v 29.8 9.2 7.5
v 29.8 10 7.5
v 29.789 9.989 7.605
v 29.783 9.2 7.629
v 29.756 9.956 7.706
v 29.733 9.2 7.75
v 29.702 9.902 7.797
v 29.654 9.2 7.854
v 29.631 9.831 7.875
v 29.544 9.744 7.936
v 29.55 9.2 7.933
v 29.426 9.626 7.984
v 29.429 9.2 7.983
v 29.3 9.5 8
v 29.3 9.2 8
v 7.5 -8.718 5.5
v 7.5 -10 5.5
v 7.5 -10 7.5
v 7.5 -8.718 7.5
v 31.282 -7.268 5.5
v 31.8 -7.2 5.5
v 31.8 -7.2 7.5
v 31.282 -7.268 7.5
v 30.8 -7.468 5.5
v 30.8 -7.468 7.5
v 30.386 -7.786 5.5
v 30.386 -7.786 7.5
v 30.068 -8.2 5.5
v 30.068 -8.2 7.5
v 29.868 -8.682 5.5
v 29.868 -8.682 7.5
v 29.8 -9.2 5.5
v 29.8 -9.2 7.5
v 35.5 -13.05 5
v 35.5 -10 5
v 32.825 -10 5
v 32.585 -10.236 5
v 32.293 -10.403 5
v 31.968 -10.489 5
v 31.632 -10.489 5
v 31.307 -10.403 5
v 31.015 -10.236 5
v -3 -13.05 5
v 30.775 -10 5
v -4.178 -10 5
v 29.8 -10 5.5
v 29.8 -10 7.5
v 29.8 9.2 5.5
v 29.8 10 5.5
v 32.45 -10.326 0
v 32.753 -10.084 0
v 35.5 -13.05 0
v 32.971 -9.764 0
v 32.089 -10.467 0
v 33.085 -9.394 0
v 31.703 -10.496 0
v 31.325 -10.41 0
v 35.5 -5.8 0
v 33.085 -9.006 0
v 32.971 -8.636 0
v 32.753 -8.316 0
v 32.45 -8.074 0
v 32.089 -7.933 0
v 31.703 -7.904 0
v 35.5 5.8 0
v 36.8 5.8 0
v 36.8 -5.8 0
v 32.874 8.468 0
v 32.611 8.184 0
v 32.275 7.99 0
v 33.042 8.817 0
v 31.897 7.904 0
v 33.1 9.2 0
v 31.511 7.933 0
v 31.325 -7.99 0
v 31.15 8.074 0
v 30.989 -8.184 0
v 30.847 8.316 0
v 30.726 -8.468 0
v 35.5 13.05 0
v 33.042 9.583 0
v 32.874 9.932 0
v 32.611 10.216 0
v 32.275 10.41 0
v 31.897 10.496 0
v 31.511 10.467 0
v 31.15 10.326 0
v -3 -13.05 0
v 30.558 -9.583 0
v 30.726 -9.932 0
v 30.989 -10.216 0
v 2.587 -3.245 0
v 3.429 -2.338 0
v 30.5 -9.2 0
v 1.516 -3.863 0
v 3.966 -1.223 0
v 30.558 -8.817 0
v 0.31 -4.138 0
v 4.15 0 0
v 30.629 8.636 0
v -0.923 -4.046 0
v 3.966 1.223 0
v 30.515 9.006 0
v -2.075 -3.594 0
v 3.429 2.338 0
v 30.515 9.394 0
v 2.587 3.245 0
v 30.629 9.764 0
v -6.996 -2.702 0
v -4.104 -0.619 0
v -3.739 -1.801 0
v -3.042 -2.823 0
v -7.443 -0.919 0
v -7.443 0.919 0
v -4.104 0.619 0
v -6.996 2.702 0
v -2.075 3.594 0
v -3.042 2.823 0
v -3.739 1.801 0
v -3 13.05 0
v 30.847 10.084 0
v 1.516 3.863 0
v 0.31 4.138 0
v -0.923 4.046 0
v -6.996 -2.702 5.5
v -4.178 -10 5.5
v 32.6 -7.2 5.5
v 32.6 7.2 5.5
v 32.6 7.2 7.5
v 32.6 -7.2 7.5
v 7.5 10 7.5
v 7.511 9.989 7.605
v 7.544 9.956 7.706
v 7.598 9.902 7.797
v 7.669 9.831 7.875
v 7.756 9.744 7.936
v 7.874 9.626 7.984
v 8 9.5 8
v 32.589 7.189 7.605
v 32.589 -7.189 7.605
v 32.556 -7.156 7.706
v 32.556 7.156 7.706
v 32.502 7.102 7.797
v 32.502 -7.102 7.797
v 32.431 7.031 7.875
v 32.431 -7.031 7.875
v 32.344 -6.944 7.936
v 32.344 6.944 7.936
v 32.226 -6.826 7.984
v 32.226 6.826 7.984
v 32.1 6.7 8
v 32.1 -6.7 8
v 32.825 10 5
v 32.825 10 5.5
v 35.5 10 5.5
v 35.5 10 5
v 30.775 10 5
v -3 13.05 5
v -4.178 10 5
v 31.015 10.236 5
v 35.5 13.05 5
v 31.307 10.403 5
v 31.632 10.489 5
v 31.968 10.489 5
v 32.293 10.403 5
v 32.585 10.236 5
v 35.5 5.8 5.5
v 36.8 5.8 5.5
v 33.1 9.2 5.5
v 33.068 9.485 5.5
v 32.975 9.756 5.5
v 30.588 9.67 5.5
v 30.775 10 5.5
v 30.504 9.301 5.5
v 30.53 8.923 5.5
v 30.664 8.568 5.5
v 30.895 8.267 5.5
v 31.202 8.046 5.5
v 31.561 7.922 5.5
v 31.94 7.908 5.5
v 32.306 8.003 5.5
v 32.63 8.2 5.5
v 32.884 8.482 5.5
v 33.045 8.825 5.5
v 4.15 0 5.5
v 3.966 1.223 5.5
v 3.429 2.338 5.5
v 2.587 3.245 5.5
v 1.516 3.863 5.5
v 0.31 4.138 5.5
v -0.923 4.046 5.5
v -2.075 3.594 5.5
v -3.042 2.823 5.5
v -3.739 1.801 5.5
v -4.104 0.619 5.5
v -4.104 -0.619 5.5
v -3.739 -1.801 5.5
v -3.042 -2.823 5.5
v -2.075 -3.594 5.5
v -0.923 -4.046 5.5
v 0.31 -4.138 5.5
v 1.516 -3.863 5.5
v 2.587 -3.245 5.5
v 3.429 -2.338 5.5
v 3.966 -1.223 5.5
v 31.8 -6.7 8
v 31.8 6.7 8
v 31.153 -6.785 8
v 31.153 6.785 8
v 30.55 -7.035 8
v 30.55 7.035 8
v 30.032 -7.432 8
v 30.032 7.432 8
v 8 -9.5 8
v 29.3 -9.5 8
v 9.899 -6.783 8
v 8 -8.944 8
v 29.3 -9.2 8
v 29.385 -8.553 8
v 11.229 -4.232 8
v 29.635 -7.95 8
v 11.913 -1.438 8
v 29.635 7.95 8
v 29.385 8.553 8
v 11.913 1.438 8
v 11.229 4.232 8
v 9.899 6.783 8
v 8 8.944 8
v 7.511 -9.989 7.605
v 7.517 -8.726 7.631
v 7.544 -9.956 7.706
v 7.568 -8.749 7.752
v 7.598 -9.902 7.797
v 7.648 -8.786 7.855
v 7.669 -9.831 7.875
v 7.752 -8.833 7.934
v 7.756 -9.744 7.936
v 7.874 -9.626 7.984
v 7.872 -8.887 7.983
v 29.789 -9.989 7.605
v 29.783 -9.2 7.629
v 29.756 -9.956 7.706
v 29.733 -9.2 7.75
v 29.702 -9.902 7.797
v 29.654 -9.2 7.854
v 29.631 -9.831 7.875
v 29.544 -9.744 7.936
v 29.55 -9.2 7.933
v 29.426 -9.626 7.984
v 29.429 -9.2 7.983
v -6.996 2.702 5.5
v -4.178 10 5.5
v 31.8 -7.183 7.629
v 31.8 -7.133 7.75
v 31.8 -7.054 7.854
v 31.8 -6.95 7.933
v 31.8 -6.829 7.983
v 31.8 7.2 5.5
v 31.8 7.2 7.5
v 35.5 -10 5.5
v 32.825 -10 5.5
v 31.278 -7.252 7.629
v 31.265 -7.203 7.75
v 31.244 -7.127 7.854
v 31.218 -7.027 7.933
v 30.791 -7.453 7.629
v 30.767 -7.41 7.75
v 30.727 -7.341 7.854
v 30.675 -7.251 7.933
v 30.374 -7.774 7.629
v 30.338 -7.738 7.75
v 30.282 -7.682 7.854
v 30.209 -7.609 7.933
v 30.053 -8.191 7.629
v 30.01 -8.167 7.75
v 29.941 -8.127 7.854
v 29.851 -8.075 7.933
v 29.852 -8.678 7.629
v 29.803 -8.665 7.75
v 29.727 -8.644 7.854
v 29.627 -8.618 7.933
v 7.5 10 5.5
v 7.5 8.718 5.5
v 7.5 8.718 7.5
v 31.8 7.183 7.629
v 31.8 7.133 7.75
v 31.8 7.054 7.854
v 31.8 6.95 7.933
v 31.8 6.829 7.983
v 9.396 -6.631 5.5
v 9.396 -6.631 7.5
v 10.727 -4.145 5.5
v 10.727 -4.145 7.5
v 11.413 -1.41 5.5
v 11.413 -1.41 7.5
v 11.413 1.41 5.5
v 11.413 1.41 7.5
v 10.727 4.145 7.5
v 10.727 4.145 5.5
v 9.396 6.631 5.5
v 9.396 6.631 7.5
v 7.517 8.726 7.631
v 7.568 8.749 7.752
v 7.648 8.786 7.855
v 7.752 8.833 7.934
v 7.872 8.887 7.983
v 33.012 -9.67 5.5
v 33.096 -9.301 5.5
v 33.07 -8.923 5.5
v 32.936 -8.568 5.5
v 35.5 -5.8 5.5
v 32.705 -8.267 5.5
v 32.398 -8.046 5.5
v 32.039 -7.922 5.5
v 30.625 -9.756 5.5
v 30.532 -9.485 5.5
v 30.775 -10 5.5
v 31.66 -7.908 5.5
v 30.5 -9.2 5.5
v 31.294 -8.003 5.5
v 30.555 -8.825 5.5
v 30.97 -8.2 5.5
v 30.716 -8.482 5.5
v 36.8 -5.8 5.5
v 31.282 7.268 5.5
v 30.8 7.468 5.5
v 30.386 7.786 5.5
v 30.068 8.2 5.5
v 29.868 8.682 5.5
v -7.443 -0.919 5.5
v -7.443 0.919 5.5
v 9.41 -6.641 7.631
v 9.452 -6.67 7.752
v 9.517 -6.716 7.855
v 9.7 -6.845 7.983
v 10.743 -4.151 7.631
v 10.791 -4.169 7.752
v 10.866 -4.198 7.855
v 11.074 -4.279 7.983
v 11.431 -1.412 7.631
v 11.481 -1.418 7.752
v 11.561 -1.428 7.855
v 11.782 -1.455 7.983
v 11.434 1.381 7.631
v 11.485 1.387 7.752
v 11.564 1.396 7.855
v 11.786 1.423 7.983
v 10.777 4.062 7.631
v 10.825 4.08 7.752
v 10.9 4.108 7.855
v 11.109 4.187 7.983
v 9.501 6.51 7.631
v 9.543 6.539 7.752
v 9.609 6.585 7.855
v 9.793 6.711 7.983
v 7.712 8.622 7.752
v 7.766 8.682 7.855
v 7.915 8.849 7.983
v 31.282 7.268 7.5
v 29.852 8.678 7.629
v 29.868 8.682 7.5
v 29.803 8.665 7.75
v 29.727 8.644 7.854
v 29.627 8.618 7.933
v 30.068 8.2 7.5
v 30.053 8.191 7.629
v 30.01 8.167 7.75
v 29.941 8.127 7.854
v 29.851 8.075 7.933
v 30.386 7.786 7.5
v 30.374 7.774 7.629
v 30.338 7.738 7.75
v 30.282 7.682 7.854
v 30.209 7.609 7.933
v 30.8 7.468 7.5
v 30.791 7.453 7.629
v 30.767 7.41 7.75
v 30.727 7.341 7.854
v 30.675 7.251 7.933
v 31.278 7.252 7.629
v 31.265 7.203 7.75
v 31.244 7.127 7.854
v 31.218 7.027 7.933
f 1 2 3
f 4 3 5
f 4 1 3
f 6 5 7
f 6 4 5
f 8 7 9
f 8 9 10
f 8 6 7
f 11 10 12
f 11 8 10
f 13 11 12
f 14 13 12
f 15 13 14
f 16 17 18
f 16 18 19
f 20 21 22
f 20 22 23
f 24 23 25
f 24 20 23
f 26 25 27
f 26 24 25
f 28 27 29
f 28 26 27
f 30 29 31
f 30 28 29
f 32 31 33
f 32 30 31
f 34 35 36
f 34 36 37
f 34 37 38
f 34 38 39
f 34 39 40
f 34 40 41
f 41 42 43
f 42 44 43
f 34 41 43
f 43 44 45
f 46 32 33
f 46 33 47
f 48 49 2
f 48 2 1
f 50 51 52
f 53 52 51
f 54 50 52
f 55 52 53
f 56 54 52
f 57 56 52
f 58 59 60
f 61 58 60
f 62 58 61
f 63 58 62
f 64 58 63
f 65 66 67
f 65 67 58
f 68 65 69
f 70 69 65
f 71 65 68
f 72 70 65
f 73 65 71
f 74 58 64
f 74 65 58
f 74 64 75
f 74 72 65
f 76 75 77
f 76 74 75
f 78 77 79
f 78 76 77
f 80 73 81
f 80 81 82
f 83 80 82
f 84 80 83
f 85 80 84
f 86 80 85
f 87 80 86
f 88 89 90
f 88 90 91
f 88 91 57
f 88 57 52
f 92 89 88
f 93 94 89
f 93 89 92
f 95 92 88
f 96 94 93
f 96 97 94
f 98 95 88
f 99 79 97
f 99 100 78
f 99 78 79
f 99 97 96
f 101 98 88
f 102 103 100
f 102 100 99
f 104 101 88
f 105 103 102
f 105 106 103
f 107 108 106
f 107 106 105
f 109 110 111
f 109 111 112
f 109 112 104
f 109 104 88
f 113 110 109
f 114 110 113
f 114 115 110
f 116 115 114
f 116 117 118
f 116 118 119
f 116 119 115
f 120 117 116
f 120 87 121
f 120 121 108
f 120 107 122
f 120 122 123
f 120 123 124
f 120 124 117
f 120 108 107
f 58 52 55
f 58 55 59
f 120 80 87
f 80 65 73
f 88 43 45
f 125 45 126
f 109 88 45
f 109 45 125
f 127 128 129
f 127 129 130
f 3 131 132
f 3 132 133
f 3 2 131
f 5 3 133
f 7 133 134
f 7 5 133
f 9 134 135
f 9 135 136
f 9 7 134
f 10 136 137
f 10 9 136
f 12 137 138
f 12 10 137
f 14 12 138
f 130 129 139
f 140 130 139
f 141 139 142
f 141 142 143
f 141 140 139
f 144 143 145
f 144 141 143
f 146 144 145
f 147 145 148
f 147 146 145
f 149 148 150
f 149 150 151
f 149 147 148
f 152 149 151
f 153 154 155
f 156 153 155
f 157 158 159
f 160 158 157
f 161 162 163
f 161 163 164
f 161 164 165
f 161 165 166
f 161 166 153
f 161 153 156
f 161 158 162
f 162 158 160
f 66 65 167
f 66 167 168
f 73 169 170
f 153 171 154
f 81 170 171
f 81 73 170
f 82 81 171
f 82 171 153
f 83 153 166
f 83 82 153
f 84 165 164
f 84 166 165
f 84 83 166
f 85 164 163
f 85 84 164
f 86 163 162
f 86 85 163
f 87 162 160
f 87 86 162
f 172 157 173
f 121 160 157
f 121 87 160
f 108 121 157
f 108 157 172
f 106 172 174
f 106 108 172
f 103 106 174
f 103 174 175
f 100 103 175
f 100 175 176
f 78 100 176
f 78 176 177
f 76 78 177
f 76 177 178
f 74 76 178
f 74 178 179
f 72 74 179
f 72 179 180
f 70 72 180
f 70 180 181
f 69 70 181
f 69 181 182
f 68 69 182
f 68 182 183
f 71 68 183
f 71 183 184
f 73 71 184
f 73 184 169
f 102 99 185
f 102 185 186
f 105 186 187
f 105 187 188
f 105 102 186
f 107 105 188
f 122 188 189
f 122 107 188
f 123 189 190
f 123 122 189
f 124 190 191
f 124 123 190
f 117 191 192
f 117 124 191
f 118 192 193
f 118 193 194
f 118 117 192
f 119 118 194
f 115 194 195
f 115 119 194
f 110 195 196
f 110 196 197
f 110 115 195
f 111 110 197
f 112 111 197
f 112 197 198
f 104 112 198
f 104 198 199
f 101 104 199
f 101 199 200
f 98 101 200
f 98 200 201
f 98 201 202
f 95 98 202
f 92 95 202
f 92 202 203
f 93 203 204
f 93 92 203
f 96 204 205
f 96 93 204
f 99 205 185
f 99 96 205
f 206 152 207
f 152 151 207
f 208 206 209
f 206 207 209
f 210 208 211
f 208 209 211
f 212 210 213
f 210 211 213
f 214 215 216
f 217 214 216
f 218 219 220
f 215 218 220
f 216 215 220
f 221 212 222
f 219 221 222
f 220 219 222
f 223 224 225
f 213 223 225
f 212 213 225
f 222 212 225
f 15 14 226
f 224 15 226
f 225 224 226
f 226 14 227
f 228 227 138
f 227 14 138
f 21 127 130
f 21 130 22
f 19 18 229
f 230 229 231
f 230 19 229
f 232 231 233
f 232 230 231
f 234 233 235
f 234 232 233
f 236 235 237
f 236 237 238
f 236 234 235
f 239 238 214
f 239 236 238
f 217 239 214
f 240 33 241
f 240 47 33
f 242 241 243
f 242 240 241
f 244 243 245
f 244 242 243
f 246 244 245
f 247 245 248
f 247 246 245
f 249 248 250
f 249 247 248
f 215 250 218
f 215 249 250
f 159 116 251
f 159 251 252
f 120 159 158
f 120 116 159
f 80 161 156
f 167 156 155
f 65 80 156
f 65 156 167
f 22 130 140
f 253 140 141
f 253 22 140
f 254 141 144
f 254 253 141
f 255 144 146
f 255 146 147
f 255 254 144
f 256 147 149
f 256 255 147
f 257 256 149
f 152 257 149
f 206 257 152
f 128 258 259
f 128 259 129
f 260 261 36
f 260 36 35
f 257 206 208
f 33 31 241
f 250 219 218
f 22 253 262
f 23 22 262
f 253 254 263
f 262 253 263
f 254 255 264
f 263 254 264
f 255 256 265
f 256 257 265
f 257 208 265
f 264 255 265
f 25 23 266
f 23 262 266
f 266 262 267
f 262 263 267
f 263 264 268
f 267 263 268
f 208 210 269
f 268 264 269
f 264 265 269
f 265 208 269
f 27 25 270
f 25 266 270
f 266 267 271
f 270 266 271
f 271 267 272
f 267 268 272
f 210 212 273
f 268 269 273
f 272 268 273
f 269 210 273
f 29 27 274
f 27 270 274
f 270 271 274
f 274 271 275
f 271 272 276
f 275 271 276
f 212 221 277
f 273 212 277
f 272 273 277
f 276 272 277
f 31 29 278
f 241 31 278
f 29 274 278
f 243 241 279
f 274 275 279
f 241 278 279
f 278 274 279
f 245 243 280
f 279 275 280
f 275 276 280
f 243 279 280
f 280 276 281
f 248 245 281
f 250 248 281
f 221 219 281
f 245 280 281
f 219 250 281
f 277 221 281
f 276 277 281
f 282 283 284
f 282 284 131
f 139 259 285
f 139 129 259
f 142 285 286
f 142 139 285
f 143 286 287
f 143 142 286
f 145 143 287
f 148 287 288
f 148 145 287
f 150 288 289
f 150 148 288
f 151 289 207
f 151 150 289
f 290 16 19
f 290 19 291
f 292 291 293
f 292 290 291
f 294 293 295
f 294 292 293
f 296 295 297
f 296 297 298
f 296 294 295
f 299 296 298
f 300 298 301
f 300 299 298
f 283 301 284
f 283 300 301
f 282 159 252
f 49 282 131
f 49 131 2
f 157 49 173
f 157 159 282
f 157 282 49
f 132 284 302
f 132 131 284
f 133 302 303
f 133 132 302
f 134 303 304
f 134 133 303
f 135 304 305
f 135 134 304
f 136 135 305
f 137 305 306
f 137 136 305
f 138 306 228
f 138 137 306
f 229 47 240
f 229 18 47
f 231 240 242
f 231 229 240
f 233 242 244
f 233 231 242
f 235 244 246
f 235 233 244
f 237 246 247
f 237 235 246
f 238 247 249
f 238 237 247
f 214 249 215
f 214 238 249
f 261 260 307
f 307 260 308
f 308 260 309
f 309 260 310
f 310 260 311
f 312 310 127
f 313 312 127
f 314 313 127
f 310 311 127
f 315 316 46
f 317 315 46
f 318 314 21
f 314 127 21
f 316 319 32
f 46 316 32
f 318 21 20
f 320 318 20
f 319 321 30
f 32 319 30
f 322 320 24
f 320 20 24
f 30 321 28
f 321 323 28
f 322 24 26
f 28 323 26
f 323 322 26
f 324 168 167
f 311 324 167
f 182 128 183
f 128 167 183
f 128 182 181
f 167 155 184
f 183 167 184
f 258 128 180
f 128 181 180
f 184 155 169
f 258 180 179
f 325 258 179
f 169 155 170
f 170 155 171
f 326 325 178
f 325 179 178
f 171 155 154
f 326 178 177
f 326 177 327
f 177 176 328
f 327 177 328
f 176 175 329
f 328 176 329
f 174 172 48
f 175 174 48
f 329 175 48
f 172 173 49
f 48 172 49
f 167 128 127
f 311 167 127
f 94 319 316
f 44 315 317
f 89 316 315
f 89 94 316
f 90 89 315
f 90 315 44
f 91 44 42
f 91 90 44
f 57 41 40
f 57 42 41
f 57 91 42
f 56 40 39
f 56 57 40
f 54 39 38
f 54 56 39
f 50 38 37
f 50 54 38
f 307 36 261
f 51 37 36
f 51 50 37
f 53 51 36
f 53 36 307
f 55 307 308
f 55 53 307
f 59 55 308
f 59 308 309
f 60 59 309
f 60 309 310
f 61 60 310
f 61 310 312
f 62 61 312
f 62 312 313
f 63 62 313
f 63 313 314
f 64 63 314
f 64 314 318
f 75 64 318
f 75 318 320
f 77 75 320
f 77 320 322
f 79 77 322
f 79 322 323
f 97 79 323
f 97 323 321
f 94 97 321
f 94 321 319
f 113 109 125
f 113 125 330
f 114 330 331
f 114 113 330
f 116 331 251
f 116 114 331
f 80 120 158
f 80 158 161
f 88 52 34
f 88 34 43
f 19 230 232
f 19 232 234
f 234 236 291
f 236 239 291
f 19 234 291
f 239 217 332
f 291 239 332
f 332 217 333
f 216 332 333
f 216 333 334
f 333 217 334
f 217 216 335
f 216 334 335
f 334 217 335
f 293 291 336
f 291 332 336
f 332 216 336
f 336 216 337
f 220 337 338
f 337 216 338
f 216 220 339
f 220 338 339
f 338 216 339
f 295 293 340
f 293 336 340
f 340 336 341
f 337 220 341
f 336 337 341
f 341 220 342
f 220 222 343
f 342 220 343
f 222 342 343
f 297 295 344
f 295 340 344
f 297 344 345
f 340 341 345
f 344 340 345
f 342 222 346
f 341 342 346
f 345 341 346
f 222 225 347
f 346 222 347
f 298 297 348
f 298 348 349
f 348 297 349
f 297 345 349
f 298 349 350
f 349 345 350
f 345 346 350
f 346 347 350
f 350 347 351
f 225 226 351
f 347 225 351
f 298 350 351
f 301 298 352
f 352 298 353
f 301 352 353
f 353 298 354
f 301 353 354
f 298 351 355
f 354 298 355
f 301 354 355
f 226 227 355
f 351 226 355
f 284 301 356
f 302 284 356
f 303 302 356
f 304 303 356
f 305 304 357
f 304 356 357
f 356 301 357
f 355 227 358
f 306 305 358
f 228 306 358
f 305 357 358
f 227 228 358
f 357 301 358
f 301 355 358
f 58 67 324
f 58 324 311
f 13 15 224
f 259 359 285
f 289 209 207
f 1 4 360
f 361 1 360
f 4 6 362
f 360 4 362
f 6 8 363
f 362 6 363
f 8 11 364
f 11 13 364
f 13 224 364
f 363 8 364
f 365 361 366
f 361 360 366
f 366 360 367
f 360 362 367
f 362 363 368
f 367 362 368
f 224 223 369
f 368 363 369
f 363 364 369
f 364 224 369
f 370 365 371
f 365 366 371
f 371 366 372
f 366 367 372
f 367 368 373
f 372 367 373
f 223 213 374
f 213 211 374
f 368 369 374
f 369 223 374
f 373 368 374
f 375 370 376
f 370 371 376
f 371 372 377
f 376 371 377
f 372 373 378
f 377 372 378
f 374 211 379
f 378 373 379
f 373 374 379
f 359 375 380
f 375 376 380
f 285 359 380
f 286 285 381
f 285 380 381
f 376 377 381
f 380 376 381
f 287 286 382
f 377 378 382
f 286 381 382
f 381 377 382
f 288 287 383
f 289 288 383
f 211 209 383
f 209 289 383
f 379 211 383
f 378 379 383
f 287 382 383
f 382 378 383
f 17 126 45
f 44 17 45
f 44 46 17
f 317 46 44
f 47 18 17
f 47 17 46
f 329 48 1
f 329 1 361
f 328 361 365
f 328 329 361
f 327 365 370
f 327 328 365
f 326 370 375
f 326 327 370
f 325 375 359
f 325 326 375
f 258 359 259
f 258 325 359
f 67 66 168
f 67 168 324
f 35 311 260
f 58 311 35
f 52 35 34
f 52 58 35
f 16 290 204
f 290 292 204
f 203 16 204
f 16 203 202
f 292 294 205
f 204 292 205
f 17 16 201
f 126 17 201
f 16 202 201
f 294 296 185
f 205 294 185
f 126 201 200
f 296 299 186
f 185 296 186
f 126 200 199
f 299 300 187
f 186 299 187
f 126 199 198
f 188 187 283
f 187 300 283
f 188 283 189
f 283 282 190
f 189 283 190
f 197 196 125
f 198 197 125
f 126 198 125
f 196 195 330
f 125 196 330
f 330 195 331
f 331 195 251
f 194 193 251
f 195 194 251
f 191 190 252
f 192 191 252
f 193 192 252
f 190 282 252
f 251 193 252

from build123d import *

# Parameters (mm, degrees)
SKETCH1_R          = 1.3
SKETCH1_R_2        = 4.15
EXTRUDE1_DEPTH     = 5.5
EXTRUDE2_DEPTH     = 2.5
FILLET1_R          = 0.5
CUT_EXTRUDE1_DEPTH = 0.5


with BuildPart() as part:
    # Sketch1 → Extrude1 (new body)
    with BuildSketch(Plane.XY):
        with BuildLine():
            Line((35.5, 5.8), (36.8, 5.8))
            Line((36.8, 5.8), (36.8, -5.8))
            Line((36.8, -5.8), (35.5, -5.8))
            Line((35.5, -5.8), (35.5, -13.05))
            Line((35.5, -13.05), (-3.00020865, -13.05))
            Line((-3.00020865, -13.05), (-6.99642445, -2.701859528))
            ThreePointArc((-6.99642445, -2.701859528), (-7.5, 0), (-6.99642445, 2.701859528))
            Line((-6.99642445, 2.701859528), (-3.00020865, 13.05))
            Line((-3.00020865, 13.05), (35.5, 13.05))
            Line((35.5, 13.05), (35.5, 5.8))
        make_face()
        with Locations((31.8, 9.2)):
            Circle(SKETCH1_R, mode=Mode.SUBTRACT)
        with Locations(Location((31.8, -9.2, 0), (0, 0, 180))):
            Circle(SKETCH1_R, mode=Mode.SUBTRACT)
        Circle(SKETCH1_R_2, mode=Mode.SUBTRACT)
    extrude(amount=EXTRUDE1_DEPTH)

    # Sketch2 → Extrude2 (add)
    with BuildSketch(Plane.XY.offset(5.5)):
        with BuildLine():
            Line((7.5, 10), (29.8, 10))
            Line((29.8, 10), (29.8, 9.2))
            ThreePointArc((29.8, 9.2), (30.385786438, 7.785786438), (31.8, 7.2))
            Line((31.8, 7.2), (32.6, 7.2))
            Line((32.6, 7.2), (32.6, -7.2))
            Line((32.6, -7.2), (31.8, -7.2))
            ThreePointArc((31.8, -7.2), (30.385786438, -7.785786438), (29.8, -9.2))
            Line((29.8, -9.2), (29.8, -10))
            Line((29.8, -10), (7.5, -10))
            Line((7.5, -10), (7.5, -8.717797887))
            ThreePointArc((7.5, -8.717797887), (11.5, 0), (7.5, 8.717797887))
            Line((7.5, 8.717797887), (7.5, 10))
        make_face()
    extrude(amount=EXTRUDE2_DEPTH)

    # Fillet1
    fillet1_edges = [part.edges().sort_by_distance(p)[0] for p in [
        (30.385786438, -7.785786438, 8),
        (32.2, -7.2, 8),
        (32.6, 0, 8),
        (32.2, 7.2, 8),
        (30.385786438, 7.785786438, 8),
        (29.8, 9.6, 8),
        (18.65, 10, 8),
        (7.5, 9.358898944, 8),
        (11.5, 0, 8),
        (7.5, -9.358898944, 8),
        (18.65, -10, 8),
        (29.8, -9.6, 8),
    ]]
    fillet(fillet1_edges, radius=FILLET1_R)

    # Sketch3 → Cut-Extrude1 (cut)
    with BuildSketch(Plane.XY.offset(5.5)):
        Polygon((-4.178049077, -10), (35.5, -10), (35.5, -13.05), (-3.00020865, -13.05), align=None)
        Polygon((-4.178049077, 10), (35.5, 10), (35.5, 13.05), (-3.00020865, 13.05), align=None)
    extrude(amount=-CUT_EXTRUDE1_DEPTH, mode=Mode.SUBTRACT)


solid = part.part
